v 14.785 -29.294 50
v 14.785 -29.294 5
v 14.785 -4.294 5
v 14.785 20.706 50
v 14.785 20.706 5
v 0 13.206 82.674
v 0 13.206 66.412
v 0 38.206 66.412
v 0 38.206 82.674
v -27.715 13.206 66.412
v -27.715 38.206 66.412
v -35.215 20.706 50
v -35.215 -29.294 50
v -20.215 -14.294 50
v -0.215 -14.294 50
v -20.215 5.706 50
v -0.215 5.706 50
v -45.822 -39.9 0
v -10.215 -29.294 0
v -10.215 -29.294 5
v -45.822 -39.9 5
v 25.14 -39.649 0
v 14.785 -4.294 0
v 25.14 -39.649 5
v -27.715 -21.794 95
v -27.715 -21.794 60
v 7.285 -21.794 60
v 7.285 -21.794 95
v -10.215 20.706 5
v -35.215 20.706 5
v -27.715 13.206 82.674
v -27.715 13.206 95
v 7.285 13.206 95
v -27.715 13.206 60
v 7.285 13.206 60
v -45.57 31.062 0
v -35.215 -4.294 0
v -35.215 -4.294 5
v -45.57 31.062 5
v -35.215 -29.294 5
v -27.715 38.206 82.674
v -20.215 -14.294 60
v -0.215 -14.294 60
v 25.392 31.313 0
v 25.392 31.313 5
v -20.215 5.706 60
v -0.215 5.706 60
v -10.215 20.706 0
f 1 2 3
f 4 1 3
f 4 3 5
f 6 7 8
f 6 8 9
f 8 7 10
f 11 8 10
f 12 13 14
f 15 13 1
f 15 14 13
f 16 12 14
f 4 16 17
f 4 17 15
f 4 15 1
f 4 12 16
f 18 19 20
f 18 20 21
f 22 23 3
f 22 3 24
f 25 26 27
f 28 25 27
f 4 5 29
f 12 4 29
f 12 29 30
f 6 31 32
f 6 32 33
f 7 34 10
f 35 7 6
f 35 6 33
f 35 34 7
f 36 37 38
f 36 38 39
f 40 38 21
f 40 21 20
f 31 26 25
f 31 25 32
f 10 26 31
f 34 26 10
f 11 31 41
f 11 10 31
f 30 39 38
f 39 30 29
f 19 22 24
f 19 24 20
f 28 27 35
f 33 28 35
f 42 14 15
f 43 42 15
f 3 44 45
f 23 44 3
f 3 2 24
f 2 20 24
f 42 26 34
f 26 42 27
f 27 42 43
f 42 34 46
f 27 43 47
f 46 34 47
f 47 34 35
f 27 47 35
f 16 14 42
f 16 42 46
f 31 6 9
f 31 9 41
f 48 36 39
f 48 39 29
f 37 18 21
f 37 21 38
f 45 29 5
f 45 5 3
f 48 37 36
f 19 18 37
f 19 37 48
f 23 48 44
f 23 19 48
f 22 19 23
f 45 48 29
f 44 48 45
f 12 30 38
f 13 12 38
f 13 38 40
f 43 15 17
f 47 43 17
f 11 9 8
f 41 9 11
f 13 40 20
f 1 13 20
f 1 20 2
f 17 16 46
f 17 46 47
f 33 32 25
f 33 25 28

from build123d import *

# Parameters (mm, degrees)
F1_DEPTH = 50
F2_W     = 20
F2_H     = 20
F3_DEPTH = 10
F4_W     = 35
F4_H     = 35
F5_DEPTH = 35
F7_DEPTH = 5
F8_W     = 27.715054
F8_H     = 16.261809
F9_DEPTH = 25


with BuildPart() as f1:
    # F0 (on Top) → F1 (new body)
    with BuildSketch(Plane.XY):
        Polygon((-10.215054, 20.70647), (-35.215054, 20.70647), (-35.215054, -29.29353), (14.784946, -29.29353), (14.784946, 20.70647), (0, 20.70647), align=None)
    extrude(amount=F1_DEPTH)

    # F2 (on face) → F3 (join)
    with BuildSketch(Plane.XY.offset(50)):
        with Locations((-10.215054, -4.29353)):
            Rectangle(F2_W, F2_H)
    extrude(amount=F3_DEPTH)

    # F4 (on face) → F5 (join)
    with BuildSketch(Plane.XY.offset(60)):
        with Locations((-10.215054, -4.29353)):
            Rectangle(F4_W, F4_H)
    extrude(amount=F5_DEPTH)

    # F6 (on face) → F7 (join)
    with BuildSketch(Plane(origin=(0, 0, 0), x_dir=(1, 0, 0), z_dir=(0, 0, -1))):
        Polygon((-10.215054, 29.29353), (-45.821656, 39.900132), (-35.215054, 4.29353), (-45.570394, -31.061809), (-10.215054, -20.70647), (25.391547, -31.313071), (14.784946, 4.29353), (25.140285, 39.648869), align=None)
    extrude(amount=-F7_DEPTH)

    # F8 (on face) → F9 (join)
    with BuildSketch(Plane(origin=(0, 13.20647, 0), x_dir=(-1, 0, 0), z_dir=(0, 1, 0))):
        with Locations((13.857527, 74.543308)):
            Rectangle(F8_W, F8_H)
    extrude(amount=F9_DEPTH)


solid = f1.part
